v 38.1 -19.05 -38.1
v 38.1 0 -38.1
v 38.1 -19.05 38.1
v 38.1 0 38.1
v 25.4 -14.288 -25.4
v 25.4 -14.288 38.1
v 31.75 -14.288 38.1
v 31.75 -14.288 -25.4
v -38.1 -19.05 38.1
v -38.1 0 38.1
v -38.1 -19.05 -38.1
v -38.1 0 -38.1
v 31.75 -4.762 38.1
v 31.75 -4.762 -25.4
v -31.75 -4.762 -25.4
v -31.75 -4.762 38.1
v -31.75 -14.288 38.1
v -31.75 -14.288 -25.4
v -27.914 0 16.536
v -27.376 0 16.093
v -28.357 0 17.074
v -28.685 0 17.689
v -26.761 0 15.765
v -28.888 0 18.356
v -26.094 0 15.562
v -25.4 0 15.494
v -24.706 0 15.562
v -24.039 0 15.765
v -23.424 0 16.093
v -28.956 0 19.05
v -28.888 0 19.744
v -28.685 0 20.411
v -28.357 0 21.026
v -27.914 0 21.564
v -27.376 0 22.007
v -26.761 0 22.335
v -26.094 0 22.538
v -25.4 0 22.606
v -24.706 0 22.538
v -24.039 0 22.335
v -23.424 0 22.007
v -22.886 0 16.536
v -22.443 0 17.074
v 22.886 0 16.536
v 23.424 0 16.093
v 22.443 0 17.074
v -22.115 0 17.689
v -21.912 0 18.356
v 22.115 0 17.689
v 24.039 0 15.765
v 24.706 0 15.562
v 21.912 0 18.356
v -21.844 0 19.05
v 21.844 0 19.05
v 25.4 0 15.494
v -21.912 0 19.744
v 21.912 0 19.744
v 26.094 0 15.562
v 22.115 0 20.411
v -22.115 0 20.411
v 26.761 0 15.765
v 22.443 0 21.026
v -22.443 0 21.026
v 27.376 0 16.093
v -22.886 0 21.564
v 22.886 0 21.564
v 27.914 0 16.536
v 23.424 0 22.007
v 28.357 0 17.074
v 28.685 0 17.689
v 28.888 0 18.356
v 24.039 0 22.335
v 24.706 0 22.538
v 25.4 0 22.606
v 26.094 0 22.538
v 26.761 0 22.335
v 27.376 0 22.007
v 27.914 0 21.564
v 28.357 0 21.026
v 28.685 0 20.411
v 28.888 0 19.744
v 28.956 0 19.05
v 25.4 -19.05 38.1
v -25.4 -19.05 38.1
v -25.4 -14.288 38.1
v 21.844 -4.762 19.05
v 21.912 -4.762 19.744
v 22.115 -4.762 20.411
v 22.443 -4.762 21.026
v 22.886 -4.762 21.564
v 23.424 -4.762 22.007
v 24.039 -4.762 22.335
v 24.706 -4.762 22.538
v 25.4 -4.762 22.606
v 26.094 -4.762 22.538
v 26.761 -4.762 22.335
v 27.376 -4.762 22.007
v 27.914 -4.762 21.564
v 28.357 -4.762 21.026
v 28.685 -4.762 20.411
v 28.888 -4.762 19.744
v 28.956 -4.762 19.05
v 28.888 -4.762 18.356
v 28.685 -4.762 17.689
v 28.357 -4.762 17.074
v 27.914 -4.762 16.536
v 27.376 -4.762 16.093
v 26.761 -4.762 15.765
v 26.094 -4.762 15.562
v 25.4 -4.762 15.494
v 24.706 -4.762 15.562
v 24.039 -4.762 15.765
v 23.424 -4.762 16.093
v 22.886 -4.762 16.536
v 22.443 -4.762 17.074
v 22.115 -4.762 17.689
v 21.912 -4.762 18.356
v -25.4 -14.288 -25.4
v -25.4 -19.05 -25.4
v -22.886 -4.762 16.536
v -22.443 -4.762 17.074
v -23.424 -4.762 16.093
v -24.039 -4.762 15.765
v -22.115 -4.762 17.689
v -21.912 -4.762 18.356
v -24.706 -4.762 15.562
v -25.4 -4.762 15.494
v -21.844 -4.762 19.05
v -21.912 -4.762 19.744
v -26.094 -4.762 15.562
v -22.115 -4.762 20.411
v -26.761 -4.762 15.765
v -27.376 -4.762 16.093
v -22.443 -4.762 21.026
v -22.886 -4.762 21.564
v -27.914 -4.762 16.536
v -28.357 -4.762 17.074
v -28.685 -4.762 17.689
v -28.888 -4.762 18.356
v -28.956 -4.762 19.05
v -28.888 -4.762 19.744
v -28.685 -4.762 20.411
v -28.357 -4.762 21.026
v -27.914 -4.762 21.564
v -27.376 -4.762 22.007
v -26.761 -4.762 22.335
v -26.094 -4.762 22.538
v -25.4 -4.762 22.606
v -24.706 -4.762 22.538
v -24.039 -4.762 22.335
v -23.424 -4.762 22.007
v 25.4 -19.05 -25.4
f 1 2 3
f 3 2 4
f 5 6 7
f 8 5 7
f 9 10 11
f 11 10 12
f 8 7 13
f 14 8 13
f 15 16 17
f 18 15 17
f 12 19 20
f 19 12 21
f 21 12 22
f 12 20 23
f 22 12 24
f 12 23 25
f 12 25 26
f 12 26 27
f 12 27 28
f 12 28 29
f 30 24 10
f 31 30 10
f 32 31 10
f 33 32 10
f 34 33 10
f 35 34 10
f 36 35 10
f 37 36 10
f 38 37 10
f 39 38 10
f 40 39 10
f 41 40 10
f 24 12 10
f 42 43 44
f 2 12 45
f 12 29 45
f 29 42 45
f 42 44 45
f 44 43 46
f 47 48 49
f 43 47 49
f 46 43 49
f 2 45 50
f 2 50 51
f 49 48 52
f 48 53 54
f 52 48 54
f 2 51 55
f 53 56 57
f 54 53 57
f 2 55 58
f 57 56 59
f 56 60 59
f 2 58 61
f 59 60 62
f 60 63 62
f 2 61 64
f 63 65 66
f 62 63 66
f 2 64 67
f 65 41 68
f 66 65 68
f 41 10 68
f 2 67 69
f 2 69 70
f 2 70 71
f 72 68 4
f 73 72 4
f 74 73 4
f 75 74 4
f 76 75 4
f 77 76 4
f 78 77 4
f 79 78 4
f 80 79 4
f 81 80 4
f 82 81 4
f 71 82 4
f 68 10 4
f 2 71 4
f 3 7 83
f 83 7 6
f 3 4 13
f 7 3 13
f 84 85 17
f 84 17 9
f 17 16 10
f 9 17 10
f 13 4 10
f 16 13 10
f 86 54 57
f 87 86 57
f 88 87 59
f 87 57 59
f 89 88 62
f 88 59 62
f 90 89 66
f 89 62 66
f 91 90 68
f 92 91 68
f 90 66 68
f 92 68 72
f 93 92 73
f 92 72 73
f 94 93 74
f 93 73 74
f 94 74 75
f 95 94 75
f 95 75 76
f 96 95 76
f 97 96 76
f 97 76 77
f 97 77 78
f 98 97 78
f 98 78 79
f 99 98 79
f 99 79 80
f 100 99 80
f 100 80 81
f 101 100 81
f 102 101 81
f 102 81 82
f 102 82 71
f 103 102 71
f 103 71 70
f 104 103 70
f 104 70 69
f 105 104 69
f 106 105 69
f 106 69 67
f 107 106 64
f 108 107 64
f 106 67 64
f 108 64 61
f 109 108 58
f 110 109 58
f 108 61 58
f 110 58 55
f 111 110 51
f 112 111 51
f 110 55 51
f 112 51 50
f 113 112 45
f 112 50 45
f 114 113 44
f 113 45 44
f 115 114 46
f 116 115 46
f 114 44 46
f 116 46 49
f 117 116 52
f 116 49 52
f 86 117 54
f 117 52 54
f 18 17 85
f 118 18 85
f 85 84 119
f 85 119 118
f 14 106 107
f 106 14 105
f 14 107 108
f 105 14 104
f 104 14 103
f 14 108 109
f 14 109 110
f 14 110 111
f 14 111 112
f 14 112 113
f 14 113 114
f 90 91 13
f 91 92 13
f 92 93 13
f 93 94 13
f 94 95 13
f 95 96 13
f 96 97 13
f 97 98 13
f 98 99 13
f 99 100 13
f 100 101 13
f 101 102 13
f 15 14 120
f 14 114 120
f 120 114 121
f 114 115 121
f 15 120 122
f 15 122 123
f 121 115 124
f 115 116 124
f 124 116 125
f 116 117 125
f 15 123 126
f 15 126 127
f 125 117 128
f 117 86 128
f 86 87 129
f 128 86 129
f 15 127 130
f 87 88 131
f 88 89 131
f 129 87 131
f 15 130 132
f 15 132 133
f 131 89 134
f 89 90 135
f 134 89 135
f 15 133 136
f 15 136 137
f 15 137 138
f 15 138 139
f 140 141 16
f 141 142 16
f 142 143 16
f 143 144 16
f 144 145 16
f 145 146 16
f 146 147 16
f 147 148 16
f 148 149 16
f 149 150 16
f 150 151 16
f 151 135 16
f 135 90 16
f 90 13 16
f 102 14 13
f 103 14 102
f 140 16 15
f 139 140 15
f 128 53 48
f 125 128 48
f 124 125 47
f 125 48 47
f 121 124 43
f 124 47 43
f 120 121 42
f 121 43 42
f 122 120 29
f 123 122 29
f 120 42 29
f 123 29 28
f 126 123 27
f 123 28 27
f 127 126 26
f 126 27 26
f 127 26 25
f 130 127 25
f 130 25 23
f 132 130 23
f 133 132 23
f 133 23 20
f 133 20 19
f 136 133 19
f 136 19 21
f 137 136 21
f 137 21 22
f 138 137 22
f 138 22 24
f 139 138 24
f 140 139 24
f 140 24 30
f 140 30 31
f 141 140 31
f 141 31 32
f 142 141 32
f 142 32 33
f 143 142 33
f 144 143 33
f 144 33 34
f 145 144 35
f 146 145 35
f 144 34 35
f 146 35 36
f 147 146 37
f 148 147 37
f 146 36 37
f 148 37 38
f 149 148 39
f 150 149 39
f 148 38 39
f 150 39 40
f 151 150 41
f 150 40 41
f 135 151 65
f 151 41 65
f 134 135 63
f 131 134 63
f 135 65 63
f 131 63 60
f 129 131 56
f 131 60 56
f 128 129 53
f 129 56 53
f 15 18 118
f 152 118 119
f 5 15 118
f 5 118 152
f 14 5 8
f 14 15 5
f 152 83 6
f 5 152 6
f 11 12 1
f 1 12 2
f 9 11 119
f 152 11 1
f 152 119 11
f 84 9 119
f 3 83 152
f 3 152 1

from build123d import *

# Parameters (mm, degrees)
F1_DEPTH = 19.05
F2_W     = 6.35
F2_H     = 4.7625
F2_W_2   = 50.8
F3_DEPTH = 63.5
F5_DEPTH = 10.16


with BuildPart() as f1:
    # F0 (on Front) → F1 (new body)
    with BuildSketch(Plane.XZ):
        Polygon((0, -38.1), (0, 0), (0, 38.1), (-38.1, 38.1), (-38.1, 0), (-38.1, -38.1), align=None)
        Polygon((0, 38.1), (0, 0), (0, -38.1), (38.1, -38.1), (38.1, 0), (38.1, 38.1), align=None)
    extrude(amount=F1_DEPTH)

    # F2 (on face) → F3 (cut)
    with BuildSketch(Plane.XY.offset(38.1)):
        Polygon((-25.4, -14.2875), (25.4, -14.2875), (25.4, -9.525), (25.4, -4.7625), (-25.4, -4.7625), (-25.4, -9.525), align=None)
        with Locations((28.575, -11.90625)):
            Rectangle(F2_W, F2_H)
        with Locations((28.575, -7.14375)):
            Rectangle(F2_W, F2_H)
        with Locations((-28.575, -11.90625)):
            Rectangle(F2_W, F2_H)
        with Locations((-28.575, -7.14375)):
            Rectangle(F2_W, F2_H)
        with Locations((0, -16.66875)):
            Rectangle(F2_W_2, F2_H)
    extrude(amount=-F3_DEPTH, mode=Mode.SUBTRACT)

    # F4 (on face) → F5 (cut)
    with BuildSketch(Plane(origin=(0, 0, 0), x_dir=(-1, 0, 0), z_dir=(0, 1, 0))):
        with BuildLine():
            ThreePointArc((-28.956, 19.05), (-25.4, 15.494), (-21.844, 19.05))
            Line((-21.844, 19.05), (-25.4, 19.05))
            Line((-25.4, 19.05), (-28.956, 19.05))
        make_face()
        with BuildLine():
            Line((-25.4, 19.05), (-21.844, 19.05))
            ThreePointArc((-21.844, 19.05), (-25.4, 22.606), (-28.956, 19.05))
            Line((-28.956, 19.05), (-25.4, 19.05))
        make_face()
        with BuildLine():
            ThreePointArc((28.956, 19.05), (25.4, 22.606), (21.844, 19.05))
            Line((21.844, 19.05), (25.4, 19.05))
            Line((25.4, 19.05), (28.956, 19.05))
        make_face()
        with BuildLine():
            Line((25.4, 19.05), (21.844, 19.05))
            ThreePointArc((21.844, 19.05), (25.4, 15.494), (28.956, 19.05))
            Line((28.956, 19.05), (25.4, 19.05))
        make_face()
    extrude(amount=-F5_DEPTH, mode=Mode.SUBTRACT)


solid = f1.part
